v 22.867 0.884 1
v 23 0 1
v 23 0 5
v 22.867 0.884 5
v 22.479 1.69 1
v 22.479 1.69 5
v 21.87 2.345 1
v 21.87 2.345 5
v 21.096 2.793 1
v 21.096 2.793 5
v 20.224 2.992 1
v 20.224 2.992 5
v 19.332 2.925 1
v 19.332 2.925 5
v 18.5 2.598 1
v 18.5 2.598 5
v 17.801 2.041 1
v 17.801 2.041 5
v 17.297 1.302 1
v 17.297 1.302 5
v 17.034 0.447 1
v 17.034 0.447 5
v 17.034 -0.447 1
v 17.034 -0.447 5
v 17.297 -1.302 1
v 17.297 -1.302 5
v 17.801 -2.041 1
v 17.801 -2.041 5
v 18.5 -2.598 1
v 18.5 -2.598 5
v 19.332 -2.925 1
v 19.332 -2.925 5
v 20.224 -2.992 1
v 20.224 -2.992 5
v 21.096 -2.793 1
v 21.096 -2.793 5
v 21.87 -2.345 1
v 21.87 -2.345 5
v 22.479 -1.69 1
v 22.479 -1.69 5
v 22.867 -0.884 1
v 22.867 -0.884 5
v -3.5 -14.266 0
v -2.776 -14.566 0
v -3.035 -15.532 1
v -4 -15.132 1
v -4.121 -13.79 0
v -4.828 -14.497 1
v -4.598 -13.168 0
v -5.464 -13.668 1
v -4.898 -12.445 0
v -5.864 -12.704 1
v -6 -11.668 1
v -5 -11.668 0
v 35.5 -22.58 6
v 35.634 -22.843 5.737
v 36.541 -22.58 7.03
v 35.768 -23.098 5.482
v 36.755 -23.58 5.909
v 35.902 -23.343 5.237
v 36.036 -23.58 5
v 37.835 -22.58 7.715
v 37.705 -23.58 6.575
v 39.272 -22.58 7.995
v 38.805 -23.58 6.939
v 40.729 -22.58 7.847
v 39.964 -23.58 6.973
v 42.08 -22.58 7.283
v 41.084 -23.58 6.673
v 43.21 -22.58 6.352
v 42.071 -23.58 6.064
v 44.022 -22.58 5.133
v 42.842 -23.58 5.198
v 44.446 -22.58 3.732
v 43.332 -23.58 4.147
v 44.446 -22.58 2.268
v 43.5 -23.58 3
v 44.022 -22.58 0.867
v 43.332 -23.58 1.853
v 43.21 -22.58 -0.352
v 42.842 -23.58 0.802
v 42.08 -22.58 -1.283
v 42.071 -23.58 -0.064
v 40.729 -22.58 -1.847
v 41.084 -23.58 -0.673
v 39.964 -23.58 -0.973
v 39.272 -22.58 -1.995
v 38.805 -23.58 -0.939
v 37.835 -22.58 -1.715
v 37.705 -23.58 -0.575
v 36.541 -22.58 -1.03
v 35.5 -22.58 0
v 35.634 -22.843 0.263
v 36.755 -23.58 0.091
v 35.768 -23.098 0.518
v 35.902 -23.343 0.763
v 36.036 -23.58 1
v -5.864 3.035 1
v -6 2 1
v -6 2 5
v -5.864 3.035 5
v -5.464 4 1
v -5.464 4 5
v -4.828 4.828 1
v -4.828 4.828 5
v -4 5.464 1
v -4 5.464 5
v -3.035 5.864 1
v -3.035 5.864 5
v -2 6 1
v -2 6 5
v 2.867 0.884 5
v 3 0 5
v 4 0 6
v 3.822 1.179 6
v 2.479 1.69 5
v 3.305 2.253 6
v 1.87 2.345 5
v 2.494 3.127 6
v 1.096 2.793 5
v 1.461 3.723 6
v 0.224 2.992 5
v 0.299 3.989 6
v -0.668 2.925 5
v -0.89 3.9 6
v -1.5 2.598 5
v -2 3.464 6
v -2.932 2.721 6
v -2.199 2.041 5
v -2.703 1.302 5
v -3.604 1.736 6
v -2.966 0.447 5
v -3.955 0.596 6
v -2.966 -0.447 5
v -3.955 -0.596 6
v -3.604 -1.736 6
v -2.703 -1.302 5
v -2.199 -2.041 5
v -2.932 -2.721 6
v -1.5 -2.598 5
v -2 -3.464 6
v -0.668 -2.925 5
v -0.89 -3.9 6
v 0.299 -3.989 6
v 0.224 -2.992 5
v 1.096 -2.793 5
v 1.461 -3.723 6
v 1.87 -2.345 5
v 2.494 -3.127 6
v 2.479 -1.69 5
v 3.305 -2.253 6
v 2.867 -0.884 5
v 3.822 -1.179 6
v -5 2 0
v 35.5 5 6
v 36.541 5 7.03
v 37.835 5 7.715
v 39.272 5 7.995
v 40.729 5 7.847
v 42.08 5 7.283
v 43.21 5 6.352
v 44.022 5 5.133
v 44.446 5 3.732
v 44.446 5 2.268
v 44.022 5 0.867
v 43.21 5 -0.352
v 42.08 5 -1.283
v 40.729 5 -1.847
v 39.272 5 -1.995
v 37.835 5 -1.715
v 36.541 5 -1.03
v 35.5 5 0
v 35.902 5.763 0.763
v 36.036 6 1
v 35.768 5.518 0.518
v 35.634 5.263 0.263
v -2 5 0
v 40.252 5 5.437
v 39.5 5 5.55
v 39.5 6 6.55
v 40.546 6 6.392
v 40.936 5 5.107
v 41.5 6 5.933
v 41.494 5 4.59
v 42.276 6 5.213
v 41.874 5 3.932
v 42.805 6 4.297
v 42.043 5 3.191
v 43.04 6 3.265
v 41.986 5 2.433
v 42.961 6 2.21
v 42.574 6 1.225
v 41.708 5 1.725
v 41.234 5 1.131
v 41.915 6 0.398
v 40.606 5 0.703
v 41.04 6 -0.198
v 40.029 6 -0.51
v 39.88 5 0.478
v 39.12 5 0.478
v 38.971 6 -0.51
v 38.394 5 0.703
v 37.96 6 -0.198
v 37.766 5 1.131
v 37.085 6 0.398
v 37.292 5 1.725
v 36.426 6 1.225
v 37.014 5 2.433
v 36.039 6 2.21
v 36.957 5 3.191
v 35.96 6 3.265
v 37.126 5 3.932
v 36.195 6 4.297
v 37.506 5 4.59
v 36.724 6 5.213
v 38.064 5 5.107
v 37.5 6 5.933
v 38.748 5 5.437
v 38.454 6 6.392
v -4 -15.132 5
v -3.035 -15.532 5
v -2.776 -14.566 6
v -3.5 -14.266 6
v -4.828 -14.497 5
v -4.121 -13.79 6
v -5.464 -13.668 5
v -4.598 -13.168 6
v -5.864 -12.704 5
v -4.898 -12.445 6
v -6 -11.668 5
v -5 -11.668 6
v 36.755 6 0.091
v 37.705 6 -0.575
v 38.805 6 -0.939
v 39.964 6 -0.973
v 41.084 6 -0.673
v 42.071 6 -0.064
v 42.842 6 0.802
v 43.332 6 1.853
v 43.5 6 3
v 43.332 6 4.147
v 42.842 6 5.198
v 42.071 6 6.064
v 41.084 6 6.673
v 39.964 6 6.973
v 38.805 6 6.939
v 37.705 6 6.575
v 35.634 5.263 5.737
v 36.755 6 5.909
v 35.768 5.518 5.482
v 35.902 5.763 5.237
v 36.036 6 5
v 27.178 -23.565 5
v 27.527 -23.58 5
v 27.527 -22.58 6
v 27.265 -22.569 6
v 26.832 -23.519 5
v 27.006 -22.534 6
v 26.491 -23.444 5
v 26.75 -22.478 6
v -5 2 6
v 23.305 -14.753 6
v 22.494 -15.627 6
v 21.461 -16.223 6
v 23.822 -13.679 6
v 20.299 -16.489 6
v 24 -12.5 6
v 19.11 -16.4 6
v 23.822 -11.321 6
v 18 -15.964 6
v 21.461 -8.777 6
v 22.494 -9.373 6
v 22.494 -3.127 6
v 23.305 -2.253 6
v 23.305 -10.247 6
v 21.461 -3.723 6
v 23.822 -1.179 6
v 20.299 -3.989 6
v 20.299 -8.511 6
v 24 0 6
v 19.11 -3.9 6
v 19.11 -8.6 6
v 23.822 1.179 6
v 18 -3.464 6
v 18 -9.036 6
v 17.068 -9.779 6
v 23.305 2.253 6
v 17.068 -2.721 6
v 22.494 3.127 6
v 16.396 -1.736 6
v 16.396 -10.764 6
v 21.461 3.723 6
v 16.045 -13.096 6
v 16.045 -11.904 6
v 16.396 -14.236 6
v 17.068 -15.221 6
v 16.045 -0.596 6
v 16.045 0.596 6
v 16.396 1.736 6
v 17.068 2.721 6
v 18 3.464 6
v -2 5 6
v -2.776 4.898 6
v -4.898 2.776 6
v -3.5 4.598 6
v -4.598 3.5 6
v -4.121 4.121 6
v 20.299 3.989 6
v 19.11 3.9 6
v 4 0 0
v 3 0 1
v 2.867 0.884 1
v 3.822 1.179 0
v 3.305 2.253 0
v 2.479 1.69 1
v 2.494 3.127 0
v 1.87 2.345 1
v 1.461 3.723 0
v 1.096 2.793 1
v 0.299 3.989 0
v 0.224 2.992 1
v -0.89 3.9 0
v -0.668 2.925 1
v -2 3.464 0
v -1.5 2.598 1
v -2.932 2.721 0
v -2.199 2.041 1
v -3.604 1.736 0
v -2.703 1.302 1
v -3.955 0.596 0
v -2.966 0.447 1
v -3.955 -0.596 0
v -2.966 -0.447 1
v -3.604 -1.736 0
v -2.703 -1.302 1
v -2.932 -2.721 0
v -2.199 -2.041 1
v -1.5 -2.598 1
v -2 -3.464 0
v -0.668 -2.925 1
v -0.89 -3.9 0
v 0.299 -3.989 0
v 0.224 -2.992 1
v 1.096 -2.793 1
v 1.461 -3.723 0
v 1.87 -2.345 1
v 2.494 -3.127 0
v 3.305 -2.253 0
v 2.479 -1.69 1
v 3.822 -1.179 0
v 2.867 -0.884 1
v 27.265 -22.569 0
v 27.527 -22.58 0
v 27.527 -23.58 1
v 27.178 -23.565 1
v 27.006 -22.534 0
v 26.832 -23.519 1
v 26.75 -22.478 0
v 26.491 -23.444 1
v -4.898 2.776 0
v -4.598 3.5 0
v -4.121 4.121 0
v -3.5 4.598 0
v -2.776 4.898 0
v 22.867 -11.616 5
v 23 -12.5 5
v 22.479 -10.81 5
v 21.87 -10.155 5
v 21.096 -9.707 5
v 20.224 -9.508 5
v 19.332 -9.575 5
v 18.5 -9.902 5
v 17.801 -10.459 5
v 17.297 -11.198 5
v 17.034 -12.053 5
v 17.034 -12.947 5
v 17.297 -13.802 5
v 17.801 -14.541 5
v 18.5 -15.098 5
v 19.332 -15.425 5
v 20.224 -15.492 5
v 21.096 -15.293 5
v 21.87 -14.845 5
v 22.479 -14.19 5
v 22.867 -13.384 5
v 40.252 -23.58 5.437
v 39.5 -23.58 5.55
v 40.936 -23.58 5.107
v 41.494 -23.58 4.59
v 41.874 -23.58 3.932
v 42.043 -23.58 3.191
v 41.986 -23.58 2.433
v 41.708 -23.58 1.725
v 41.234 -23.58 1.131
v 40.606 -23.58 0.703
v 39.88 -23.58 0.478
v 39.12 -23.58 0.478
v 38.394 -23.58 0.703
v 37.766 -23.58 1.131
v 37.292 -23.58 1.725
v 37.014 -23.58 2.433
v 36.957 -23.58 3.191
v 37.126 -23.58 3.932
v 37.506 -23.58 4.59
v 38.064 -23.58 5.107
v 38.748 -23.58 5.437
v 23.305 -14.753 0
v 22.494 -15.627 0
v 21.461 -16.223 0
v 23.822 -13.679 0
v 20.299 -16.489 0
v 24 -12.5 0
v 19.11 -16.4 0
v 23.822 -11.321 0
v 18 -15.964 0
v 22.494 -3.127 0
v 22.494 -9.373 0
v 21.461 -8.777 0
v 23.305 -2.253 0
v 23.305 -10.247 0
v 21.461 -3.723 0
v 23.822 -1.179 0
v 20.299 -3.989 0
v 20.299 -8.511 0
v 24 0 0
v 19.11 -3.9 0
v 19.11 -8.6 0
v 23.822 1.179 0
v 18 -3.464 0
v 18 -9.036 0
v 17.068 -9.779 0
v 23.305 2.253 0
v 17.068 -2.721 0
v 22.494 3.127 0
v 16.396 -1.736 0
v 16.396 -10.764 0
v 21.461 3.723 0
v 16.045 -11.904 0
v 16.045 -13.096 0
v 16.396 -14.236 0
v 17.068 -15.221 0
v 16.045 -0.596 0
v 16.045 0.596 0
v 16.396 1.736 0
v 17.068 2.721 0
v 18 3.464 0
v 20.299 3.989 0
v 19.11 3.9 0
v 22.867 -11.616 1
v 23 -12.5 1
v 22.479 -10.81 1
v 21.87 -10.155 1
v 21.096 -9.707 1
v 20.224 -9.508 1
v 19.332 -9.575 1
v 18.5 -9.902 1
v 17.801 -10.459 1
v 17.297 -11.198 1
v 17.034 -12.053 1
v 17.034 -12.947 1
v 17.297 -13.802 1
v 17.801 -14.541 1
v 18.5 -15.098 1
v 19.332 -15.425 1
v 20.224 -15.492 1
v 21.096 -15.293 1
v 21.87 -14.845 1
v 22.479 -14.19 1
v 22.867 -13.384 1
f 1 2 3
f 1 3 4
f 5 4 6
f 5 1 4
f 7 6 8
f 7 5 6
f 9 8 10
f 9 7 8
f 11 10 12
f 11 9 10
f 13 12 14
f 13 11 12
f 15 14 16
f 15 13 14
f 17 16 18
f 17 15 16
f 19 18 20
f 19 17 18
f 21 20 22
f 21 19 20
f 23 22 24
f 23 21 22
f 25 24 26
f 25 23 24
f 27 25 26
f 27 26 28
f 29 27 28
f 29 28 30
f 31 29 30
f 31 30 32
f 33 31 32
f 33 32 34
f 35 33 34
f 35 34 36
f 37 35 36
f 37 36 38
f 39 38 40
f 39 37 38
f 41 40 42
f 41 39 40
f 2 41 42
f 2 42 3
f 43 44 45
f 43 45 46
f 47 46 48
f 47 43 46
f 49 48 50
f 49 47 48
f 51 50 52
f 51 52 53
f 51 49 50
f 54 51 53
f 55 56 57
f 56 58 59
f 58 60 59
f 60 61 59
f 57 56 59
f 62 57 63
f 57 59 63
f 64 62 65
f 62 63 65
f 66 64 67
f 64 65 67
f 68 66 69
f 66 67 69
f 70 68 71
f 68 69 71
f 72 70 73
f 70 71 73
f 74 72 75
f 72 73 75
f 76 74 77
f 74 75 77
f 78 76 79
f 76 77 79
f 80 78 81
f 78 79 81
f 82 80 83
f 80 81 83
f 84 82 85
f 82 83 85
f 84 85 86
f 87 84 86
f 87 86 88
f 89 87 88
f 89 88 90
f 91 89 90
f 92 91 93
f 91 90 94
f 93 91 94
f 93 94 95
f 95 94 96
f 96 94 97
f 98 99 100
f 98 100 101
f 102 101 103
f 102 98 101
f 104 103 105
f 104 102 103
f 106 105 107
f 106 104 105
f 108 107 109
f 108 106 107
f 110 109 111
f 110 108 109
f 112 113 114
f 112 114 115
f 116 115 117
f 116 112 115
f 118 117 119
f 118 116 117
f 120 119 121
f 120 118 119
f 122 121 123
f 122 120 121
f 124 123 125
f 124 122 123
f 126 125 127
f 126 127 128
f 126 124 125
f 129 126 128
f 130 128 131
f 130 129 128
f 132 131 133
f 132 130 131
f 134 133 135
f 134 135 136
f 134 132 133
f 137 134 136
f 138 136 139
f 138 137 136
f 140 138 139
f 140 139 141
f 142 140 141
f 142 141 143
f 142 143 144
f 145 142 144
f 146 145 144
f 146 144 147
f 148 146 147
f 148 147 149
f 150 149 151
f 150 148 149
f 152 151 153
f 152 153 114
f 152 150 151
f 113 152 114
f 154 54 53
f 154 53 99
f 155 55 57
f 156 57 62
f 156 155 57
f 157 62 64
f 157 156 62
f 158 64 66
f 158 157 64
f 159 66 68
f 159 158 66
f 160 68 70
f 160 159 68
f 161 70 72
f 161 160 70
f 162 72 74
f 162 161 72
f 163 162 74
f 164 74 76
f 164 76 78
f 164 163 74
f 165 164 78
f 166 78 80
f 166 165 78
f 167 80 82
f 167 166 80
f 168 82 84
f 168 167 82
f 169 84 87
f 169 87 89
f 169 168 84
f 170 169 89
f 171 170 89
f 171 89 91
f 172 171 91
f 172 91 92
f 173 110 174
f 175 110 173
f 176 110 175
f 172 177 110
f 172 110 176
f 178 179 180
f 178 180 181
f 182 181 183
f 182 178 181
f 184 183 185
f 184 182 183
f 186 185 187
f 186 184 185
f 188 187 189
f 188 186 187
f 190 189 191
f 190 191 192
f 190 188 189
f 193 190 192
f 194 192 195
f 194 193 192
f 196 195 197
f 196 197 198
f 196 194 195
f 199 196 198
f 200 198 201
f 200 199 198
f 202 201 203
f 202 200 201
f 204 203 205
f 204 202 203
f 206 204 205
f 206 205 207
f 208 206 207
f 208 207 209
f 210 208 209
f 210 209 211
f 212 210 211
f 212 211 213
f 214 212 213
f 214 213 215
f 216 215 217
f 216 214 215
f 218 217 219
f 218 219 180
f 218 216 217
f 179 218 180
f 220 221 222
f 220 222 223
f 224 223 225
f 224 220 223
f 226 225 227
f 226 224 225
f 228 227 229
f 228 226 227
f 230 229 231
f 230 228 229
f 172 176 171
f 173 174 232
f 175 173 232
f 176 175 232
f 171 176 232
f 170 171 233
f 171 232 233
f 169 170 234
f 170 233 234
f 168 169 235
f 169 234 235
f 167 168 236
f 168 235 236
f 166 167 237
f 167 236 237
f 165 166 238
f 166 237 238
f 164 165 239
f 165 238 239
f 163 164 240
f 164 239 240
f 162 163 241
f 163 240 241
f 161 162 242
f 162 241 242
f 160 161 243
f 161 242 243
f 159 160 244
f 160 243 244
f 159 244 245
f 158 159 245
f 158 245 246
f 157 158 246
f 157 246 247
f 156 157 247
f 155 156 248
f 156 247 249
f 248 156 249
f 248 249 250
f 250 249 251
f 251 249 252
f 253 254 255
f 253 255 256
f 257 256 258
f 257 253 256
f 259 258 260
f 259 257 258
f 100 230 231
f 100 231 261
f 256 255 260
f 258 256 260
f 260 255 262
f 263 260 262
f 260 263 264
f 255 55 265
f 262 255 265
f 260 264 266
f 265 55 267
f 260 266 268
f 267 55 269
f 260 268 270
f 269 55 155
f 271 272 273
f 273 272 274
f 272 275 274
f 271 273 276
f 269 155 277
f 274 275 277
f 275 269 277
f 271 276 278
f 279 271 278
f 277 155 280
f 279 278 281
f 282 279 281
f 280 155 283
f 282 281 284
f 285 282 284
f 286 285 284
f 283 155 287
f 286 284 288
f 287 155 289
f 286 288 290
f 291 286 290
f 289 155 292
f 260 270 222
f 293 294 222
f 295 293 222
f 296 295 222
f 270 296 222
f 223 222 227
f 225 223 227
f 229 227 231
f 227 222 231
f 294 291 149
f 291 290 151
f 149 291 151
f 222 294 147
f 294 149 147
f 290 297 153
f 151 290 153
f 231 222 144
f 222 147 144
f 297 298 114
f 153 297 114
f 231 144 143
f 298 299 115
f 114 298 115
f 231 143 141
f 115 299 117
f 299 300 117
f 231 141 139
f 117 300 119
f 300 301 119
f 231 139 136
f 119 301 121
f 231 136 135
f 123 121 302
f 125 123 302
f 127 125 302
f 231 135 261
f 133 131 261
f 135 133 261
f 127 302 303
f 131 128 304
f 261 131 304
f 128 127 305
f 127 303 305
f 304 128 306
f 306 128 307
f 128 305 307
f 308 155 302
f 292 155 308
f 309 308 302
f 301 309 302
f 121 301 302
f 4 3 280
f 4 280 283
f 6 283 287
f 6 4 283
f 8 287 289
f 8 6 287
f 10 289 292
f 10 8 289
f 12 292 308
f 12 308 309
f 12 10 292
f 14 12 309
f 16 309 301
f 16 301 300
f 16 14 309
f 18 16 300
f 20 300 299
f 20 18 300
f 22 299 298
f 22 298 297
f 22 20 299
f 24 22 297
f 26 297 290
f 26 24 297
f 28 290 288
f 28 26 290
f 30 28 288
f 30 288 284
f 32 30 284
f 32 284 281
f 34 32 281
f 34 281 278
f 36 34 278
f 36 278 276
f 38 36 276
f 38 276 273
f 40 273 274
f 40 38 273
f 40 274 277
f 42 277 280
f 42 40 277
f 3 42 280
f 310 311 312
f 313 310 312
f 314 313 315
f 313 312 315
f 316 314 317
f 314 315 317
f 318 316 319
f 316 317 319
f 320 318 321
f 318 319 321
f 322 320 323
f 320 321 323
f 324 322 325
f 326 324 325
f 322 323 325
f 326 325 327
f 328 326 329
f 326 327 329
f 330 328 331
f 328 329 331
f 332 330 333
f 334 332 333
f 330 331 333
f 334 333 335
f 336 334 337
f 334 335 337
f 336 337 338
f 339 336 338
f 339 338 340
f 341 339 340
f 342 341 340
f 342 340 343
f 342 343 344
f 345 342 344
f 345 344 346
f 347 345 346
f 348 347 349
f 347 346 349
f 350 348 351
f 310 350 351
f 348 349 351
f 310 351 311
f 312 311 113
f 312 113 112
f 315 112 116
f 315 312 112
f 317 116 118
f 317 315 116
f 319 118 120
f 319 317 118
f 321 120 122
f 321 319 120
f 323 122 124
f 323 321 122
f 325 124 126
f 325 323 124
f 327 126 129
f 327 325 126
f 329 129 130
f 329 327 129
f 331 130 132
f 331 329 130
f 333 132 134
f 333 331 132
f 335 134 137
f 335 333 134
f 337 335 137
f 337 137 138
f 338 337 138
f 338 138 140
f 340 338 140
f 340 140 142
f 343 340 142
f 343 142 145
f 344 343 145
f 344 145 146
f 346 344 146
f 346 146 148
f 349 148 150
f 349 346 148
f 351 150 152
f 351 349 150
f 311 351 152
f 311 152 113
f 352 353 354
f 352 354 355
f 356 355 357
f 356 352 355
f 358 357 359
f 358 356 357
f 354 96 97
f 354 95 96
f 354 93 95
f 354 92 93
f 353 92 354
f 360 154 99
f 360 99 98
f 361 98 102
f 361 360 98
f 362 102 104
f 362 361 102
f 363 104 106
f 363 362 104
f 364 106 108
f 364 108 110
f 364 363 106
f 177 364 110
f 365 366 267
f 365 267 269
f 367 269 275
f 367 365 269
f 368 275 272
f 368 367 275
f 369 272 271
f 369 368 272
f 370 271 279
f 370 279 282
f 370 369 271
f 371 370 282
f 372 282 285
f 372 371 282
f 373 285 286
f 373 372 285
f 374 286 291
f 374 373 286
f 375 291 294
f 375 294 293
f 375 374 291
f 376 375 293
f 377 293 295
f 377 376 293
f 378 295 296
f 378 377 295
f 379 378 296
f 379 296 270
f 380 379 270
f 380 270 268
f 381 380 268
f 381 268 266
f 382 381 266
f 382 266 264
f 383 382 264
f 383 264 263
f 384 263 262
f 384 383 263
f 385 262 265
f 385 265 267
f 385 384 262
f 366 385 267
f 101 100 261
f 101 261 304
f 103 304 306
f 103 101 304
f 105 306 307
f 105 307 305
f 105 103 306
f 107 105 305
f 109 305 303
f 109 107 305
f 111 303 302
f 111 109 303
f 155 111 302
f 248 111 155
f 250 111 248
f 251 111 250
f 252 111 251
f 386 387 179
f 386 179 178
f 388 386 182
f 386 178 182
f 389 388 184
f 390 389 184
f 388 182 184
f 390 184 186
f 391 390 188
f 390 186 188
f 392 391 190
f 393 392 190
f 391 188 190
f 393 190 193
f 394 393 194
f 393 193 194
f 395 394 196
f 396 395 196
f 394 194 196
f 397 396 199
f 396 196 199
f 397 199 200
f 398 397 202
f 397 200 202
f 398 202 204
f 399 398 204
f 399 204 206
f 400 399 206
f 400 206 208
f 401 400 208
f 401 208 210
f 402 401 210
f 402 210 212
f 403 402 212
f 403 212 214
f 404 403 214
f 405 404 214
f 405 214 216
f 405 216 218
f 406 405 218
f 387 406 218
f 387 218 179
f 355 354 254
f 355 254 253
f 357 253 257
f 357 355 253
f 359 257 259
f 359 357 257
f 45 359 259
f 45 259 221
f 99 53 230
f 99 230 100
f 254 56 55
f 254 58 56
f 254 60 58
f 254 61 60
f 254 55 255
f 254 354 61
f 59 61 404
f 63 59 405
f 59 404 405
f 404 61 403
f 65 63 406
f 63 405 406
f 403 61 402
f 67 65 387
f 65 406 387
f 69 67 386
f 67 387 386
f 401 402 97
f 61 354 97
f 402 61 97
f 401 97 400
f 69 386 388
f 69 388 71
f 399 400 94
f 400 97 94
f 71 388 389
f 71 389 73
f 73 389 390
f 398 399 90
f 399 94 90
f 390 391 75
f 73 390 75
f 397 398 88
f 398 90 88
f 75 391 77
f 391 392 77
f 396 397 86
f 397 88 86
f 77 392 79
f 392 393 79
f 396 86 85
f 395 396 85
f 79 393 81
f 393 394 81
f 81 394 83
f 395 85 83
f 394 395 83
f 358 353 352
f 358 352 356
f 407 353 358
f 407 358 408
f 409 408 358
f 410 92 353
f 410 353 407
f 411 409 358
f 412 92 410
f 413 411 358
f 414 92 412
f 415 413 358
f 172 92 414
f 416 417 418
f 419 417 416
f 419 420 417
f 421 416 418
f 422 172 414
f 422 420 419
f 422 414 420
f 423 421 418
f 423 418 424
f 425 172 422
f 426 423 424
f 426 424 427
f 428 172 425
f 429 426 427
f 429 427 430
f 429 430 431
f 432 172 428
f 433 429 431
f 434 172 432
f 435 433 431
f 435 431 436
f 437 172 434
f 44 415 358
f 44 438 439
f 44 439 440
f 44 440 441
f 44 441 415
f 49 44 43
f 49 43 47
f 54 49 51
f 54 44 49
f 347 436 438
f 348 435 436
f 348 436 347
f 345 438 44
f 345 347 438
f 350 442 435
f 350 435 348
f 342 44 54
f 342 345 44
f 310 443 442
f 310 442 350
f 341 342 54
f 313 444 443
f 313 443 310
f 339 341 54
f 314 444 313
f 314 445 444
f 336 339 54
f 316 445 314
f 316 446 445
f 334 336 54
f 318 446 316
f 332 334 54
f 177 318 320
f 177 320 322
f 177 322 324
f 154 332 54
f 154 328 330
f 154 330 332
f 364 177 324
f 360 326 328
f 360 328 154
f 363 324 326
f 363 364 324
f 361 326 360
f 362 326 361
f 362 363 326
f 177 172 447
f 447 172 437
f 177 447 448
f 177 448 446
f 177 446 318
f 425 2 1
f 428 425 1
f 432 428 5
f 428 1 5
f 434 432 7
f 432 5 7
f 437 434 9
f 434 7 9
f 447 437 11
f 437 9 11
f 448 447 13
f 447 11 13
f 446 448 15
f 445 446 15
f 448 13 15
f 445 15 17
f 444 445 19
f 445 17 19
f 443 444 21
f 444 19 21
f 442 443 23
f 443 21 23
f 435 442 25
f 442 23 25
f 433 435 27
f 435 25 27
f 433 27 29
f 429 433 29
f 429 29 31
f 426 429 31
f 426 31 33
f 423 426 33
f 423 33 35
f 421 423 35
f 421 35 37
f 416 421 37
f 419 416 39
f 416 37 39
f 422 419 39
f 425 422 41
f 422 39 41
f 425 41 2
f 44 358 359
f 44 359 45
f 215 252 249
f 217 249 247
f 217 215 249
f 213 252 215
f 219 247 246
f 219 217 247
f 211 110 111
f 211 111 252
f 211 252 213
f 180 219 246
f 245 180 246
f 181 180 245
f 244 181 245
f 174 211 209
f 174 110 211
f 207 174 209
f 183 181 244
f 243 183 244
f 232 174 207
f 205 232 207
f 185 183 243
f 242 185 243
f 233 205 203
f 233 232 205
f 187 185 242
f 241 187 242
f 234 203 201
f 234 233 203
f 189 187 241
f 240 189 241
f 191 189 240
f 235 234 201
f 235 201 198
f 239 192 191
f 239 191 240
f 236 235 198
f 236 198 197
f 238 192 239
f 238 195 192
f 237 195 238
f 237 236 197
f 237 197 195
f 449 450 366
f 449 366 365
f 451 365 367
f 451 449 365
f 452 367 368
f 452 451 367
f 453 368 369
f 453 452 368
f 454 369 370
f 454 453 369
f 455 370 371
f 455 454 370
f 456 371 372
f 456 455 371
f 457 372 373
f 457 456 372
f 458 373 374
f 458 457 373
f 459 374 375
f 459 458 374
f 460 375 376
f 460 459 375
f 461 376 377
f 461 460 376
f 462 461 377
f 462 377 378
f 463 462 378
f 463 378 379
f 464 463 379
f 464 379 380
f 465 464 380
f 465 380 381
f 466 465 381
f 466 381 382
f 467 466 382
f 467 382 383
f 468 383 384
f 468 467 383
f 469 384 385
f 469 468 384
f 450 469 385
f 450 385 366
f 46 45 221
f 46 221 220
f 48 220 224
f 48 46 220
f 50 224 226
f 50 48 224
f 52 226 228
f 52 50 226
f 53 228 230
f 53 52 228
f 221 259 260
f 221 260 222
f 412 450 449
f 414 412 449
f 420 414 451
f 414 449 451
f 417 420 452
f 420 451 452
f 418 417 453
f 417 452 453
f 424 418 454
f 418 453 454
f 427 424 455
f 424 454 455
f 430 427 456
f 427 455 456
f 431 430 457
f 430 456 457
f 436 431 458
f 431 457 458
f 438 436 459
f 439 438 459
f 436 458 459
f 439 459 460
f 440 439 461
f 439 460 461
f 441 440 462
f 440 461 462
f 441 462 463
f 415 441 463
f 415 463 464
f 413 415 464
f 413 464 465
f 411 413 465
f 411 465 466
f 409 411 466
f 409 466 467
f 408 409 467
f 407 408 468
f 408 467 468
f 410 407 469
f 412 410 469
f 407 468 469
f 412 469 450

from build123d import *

# Parameters (mm, degrees)
SKETCH_2_R          = 3
EXTRUDE_1_DEPTH     = 6
SKETCH_3_R          = 5
EXTRUDE_2_DEPTH     = 29.58
SKETCH_4_R          = 2.55
CUT_EXTRUDE_1_DEPTH = 55.029865815
CHAMFER_1_SIZE      = 1


with BuildPart() as part:
    # 草图2 → 凸台-拉伸1 (new body)
    with BuildSketch(Plane.XY):
        with BuildLine():
            Line((26.49133381, -23.443703305), (-3.03527618, -15.532072003))
            ThreePointArc((-3.03527618, -15.532072003), (-5.173413361, -14.103414414), (-6, -11.668368698))
            Line((-6, -11.668368698), (-6, 2))
            ThreePointArc((-6, 2), (-4.828427125, 4.828427125), (-2, 6))
            Line((-2, 6), (39.5, 6))
            Line((39.5, 6), (39.5, -23.58))
            Line((39.5, -23.58), (27.52660999, -23.58))
            ThreePointArc((27.52660999, -23.58), (27.004505221, -23.545779445), (26.49133381, -23.443703305))
        make_face()
        Circle(SKETCH_2_R, mode=Mode.SUBTRACT)
        with Locations((20, 0)):
            Circle(SKETCH_2_R, mode=Mode.SUBTRACT)
        with Locations((20, -12.5)):
            Circle(SKETCH_2_R, mode=Mode.SUBTRACT)
    extrude(amount=EXTRUDE_1_DEPTH)

    # 草图3 → 凸台-拉伸2 (add, through all)
    with BuildSketch(Plane(origin=(0, 6, 0), x_dir=(1, 0, 0), z_dir=(0, 1, 0))):
        with Locations((39.5, -3)):
            Circle(SKETCH_3_R)
    extrude(amount=-EXTRUDE_2_DEPTH)

    # 草图4 → 切除-拉伸1 (cut, through all)
    with BuildSketch(Plane(origin=(0, 6, 0), x_dir=(1, 0, 0), z_dir=(0, 1, 0))):
        with Locations(Location((39.5, -3, 0), (0, 0, 270))):
            Circle(SKETCH_4_R)
    extrude(amount=-CUT_EXTRUDE_1_DEPTH, mode=Mode.SUBTRACT)

    # 倒角1
    chamfer_1_edges = [part.edges().sort_by_distance(p)[0] for p in [
        (31.513304995, -23.58, 0),
        (27.004505221, -23.545779445, 0),
        (-4.828427125, 4.828427125, 6),
        (-3, 0, 0),
        (-3, 0, 6),
        (-6, -4.834184349, 6),
        (17, 0, 0),
        (17, 0, 6),
        (-5.173413361, -14.103414414, 6),
        (17, -12.5, 0),
        (17, -12.5, 6),
        (11.728028815, -19.487887654, 6),
        (16.75, 6, 0),
        (16.75, 6, 6),
        (44.5, -23.58, 3),
        (44.5, 6, 3),
        (27.004505221, -23.545779445, 6),
        (39.5, 6, 0.45),
        (11.728028815, -19.487887654, 0),
        (31.513304995, -23.58, 6),
        (-5.173413361, -14.103414414, 0),
        (-6, -4.834184349, 0),
        (-4.828427125, 4.828427125, 0),
    ]]
    chamfer(chamfer_1_edges, length=CHAMFER_1_SIZE)


solid = part.part
